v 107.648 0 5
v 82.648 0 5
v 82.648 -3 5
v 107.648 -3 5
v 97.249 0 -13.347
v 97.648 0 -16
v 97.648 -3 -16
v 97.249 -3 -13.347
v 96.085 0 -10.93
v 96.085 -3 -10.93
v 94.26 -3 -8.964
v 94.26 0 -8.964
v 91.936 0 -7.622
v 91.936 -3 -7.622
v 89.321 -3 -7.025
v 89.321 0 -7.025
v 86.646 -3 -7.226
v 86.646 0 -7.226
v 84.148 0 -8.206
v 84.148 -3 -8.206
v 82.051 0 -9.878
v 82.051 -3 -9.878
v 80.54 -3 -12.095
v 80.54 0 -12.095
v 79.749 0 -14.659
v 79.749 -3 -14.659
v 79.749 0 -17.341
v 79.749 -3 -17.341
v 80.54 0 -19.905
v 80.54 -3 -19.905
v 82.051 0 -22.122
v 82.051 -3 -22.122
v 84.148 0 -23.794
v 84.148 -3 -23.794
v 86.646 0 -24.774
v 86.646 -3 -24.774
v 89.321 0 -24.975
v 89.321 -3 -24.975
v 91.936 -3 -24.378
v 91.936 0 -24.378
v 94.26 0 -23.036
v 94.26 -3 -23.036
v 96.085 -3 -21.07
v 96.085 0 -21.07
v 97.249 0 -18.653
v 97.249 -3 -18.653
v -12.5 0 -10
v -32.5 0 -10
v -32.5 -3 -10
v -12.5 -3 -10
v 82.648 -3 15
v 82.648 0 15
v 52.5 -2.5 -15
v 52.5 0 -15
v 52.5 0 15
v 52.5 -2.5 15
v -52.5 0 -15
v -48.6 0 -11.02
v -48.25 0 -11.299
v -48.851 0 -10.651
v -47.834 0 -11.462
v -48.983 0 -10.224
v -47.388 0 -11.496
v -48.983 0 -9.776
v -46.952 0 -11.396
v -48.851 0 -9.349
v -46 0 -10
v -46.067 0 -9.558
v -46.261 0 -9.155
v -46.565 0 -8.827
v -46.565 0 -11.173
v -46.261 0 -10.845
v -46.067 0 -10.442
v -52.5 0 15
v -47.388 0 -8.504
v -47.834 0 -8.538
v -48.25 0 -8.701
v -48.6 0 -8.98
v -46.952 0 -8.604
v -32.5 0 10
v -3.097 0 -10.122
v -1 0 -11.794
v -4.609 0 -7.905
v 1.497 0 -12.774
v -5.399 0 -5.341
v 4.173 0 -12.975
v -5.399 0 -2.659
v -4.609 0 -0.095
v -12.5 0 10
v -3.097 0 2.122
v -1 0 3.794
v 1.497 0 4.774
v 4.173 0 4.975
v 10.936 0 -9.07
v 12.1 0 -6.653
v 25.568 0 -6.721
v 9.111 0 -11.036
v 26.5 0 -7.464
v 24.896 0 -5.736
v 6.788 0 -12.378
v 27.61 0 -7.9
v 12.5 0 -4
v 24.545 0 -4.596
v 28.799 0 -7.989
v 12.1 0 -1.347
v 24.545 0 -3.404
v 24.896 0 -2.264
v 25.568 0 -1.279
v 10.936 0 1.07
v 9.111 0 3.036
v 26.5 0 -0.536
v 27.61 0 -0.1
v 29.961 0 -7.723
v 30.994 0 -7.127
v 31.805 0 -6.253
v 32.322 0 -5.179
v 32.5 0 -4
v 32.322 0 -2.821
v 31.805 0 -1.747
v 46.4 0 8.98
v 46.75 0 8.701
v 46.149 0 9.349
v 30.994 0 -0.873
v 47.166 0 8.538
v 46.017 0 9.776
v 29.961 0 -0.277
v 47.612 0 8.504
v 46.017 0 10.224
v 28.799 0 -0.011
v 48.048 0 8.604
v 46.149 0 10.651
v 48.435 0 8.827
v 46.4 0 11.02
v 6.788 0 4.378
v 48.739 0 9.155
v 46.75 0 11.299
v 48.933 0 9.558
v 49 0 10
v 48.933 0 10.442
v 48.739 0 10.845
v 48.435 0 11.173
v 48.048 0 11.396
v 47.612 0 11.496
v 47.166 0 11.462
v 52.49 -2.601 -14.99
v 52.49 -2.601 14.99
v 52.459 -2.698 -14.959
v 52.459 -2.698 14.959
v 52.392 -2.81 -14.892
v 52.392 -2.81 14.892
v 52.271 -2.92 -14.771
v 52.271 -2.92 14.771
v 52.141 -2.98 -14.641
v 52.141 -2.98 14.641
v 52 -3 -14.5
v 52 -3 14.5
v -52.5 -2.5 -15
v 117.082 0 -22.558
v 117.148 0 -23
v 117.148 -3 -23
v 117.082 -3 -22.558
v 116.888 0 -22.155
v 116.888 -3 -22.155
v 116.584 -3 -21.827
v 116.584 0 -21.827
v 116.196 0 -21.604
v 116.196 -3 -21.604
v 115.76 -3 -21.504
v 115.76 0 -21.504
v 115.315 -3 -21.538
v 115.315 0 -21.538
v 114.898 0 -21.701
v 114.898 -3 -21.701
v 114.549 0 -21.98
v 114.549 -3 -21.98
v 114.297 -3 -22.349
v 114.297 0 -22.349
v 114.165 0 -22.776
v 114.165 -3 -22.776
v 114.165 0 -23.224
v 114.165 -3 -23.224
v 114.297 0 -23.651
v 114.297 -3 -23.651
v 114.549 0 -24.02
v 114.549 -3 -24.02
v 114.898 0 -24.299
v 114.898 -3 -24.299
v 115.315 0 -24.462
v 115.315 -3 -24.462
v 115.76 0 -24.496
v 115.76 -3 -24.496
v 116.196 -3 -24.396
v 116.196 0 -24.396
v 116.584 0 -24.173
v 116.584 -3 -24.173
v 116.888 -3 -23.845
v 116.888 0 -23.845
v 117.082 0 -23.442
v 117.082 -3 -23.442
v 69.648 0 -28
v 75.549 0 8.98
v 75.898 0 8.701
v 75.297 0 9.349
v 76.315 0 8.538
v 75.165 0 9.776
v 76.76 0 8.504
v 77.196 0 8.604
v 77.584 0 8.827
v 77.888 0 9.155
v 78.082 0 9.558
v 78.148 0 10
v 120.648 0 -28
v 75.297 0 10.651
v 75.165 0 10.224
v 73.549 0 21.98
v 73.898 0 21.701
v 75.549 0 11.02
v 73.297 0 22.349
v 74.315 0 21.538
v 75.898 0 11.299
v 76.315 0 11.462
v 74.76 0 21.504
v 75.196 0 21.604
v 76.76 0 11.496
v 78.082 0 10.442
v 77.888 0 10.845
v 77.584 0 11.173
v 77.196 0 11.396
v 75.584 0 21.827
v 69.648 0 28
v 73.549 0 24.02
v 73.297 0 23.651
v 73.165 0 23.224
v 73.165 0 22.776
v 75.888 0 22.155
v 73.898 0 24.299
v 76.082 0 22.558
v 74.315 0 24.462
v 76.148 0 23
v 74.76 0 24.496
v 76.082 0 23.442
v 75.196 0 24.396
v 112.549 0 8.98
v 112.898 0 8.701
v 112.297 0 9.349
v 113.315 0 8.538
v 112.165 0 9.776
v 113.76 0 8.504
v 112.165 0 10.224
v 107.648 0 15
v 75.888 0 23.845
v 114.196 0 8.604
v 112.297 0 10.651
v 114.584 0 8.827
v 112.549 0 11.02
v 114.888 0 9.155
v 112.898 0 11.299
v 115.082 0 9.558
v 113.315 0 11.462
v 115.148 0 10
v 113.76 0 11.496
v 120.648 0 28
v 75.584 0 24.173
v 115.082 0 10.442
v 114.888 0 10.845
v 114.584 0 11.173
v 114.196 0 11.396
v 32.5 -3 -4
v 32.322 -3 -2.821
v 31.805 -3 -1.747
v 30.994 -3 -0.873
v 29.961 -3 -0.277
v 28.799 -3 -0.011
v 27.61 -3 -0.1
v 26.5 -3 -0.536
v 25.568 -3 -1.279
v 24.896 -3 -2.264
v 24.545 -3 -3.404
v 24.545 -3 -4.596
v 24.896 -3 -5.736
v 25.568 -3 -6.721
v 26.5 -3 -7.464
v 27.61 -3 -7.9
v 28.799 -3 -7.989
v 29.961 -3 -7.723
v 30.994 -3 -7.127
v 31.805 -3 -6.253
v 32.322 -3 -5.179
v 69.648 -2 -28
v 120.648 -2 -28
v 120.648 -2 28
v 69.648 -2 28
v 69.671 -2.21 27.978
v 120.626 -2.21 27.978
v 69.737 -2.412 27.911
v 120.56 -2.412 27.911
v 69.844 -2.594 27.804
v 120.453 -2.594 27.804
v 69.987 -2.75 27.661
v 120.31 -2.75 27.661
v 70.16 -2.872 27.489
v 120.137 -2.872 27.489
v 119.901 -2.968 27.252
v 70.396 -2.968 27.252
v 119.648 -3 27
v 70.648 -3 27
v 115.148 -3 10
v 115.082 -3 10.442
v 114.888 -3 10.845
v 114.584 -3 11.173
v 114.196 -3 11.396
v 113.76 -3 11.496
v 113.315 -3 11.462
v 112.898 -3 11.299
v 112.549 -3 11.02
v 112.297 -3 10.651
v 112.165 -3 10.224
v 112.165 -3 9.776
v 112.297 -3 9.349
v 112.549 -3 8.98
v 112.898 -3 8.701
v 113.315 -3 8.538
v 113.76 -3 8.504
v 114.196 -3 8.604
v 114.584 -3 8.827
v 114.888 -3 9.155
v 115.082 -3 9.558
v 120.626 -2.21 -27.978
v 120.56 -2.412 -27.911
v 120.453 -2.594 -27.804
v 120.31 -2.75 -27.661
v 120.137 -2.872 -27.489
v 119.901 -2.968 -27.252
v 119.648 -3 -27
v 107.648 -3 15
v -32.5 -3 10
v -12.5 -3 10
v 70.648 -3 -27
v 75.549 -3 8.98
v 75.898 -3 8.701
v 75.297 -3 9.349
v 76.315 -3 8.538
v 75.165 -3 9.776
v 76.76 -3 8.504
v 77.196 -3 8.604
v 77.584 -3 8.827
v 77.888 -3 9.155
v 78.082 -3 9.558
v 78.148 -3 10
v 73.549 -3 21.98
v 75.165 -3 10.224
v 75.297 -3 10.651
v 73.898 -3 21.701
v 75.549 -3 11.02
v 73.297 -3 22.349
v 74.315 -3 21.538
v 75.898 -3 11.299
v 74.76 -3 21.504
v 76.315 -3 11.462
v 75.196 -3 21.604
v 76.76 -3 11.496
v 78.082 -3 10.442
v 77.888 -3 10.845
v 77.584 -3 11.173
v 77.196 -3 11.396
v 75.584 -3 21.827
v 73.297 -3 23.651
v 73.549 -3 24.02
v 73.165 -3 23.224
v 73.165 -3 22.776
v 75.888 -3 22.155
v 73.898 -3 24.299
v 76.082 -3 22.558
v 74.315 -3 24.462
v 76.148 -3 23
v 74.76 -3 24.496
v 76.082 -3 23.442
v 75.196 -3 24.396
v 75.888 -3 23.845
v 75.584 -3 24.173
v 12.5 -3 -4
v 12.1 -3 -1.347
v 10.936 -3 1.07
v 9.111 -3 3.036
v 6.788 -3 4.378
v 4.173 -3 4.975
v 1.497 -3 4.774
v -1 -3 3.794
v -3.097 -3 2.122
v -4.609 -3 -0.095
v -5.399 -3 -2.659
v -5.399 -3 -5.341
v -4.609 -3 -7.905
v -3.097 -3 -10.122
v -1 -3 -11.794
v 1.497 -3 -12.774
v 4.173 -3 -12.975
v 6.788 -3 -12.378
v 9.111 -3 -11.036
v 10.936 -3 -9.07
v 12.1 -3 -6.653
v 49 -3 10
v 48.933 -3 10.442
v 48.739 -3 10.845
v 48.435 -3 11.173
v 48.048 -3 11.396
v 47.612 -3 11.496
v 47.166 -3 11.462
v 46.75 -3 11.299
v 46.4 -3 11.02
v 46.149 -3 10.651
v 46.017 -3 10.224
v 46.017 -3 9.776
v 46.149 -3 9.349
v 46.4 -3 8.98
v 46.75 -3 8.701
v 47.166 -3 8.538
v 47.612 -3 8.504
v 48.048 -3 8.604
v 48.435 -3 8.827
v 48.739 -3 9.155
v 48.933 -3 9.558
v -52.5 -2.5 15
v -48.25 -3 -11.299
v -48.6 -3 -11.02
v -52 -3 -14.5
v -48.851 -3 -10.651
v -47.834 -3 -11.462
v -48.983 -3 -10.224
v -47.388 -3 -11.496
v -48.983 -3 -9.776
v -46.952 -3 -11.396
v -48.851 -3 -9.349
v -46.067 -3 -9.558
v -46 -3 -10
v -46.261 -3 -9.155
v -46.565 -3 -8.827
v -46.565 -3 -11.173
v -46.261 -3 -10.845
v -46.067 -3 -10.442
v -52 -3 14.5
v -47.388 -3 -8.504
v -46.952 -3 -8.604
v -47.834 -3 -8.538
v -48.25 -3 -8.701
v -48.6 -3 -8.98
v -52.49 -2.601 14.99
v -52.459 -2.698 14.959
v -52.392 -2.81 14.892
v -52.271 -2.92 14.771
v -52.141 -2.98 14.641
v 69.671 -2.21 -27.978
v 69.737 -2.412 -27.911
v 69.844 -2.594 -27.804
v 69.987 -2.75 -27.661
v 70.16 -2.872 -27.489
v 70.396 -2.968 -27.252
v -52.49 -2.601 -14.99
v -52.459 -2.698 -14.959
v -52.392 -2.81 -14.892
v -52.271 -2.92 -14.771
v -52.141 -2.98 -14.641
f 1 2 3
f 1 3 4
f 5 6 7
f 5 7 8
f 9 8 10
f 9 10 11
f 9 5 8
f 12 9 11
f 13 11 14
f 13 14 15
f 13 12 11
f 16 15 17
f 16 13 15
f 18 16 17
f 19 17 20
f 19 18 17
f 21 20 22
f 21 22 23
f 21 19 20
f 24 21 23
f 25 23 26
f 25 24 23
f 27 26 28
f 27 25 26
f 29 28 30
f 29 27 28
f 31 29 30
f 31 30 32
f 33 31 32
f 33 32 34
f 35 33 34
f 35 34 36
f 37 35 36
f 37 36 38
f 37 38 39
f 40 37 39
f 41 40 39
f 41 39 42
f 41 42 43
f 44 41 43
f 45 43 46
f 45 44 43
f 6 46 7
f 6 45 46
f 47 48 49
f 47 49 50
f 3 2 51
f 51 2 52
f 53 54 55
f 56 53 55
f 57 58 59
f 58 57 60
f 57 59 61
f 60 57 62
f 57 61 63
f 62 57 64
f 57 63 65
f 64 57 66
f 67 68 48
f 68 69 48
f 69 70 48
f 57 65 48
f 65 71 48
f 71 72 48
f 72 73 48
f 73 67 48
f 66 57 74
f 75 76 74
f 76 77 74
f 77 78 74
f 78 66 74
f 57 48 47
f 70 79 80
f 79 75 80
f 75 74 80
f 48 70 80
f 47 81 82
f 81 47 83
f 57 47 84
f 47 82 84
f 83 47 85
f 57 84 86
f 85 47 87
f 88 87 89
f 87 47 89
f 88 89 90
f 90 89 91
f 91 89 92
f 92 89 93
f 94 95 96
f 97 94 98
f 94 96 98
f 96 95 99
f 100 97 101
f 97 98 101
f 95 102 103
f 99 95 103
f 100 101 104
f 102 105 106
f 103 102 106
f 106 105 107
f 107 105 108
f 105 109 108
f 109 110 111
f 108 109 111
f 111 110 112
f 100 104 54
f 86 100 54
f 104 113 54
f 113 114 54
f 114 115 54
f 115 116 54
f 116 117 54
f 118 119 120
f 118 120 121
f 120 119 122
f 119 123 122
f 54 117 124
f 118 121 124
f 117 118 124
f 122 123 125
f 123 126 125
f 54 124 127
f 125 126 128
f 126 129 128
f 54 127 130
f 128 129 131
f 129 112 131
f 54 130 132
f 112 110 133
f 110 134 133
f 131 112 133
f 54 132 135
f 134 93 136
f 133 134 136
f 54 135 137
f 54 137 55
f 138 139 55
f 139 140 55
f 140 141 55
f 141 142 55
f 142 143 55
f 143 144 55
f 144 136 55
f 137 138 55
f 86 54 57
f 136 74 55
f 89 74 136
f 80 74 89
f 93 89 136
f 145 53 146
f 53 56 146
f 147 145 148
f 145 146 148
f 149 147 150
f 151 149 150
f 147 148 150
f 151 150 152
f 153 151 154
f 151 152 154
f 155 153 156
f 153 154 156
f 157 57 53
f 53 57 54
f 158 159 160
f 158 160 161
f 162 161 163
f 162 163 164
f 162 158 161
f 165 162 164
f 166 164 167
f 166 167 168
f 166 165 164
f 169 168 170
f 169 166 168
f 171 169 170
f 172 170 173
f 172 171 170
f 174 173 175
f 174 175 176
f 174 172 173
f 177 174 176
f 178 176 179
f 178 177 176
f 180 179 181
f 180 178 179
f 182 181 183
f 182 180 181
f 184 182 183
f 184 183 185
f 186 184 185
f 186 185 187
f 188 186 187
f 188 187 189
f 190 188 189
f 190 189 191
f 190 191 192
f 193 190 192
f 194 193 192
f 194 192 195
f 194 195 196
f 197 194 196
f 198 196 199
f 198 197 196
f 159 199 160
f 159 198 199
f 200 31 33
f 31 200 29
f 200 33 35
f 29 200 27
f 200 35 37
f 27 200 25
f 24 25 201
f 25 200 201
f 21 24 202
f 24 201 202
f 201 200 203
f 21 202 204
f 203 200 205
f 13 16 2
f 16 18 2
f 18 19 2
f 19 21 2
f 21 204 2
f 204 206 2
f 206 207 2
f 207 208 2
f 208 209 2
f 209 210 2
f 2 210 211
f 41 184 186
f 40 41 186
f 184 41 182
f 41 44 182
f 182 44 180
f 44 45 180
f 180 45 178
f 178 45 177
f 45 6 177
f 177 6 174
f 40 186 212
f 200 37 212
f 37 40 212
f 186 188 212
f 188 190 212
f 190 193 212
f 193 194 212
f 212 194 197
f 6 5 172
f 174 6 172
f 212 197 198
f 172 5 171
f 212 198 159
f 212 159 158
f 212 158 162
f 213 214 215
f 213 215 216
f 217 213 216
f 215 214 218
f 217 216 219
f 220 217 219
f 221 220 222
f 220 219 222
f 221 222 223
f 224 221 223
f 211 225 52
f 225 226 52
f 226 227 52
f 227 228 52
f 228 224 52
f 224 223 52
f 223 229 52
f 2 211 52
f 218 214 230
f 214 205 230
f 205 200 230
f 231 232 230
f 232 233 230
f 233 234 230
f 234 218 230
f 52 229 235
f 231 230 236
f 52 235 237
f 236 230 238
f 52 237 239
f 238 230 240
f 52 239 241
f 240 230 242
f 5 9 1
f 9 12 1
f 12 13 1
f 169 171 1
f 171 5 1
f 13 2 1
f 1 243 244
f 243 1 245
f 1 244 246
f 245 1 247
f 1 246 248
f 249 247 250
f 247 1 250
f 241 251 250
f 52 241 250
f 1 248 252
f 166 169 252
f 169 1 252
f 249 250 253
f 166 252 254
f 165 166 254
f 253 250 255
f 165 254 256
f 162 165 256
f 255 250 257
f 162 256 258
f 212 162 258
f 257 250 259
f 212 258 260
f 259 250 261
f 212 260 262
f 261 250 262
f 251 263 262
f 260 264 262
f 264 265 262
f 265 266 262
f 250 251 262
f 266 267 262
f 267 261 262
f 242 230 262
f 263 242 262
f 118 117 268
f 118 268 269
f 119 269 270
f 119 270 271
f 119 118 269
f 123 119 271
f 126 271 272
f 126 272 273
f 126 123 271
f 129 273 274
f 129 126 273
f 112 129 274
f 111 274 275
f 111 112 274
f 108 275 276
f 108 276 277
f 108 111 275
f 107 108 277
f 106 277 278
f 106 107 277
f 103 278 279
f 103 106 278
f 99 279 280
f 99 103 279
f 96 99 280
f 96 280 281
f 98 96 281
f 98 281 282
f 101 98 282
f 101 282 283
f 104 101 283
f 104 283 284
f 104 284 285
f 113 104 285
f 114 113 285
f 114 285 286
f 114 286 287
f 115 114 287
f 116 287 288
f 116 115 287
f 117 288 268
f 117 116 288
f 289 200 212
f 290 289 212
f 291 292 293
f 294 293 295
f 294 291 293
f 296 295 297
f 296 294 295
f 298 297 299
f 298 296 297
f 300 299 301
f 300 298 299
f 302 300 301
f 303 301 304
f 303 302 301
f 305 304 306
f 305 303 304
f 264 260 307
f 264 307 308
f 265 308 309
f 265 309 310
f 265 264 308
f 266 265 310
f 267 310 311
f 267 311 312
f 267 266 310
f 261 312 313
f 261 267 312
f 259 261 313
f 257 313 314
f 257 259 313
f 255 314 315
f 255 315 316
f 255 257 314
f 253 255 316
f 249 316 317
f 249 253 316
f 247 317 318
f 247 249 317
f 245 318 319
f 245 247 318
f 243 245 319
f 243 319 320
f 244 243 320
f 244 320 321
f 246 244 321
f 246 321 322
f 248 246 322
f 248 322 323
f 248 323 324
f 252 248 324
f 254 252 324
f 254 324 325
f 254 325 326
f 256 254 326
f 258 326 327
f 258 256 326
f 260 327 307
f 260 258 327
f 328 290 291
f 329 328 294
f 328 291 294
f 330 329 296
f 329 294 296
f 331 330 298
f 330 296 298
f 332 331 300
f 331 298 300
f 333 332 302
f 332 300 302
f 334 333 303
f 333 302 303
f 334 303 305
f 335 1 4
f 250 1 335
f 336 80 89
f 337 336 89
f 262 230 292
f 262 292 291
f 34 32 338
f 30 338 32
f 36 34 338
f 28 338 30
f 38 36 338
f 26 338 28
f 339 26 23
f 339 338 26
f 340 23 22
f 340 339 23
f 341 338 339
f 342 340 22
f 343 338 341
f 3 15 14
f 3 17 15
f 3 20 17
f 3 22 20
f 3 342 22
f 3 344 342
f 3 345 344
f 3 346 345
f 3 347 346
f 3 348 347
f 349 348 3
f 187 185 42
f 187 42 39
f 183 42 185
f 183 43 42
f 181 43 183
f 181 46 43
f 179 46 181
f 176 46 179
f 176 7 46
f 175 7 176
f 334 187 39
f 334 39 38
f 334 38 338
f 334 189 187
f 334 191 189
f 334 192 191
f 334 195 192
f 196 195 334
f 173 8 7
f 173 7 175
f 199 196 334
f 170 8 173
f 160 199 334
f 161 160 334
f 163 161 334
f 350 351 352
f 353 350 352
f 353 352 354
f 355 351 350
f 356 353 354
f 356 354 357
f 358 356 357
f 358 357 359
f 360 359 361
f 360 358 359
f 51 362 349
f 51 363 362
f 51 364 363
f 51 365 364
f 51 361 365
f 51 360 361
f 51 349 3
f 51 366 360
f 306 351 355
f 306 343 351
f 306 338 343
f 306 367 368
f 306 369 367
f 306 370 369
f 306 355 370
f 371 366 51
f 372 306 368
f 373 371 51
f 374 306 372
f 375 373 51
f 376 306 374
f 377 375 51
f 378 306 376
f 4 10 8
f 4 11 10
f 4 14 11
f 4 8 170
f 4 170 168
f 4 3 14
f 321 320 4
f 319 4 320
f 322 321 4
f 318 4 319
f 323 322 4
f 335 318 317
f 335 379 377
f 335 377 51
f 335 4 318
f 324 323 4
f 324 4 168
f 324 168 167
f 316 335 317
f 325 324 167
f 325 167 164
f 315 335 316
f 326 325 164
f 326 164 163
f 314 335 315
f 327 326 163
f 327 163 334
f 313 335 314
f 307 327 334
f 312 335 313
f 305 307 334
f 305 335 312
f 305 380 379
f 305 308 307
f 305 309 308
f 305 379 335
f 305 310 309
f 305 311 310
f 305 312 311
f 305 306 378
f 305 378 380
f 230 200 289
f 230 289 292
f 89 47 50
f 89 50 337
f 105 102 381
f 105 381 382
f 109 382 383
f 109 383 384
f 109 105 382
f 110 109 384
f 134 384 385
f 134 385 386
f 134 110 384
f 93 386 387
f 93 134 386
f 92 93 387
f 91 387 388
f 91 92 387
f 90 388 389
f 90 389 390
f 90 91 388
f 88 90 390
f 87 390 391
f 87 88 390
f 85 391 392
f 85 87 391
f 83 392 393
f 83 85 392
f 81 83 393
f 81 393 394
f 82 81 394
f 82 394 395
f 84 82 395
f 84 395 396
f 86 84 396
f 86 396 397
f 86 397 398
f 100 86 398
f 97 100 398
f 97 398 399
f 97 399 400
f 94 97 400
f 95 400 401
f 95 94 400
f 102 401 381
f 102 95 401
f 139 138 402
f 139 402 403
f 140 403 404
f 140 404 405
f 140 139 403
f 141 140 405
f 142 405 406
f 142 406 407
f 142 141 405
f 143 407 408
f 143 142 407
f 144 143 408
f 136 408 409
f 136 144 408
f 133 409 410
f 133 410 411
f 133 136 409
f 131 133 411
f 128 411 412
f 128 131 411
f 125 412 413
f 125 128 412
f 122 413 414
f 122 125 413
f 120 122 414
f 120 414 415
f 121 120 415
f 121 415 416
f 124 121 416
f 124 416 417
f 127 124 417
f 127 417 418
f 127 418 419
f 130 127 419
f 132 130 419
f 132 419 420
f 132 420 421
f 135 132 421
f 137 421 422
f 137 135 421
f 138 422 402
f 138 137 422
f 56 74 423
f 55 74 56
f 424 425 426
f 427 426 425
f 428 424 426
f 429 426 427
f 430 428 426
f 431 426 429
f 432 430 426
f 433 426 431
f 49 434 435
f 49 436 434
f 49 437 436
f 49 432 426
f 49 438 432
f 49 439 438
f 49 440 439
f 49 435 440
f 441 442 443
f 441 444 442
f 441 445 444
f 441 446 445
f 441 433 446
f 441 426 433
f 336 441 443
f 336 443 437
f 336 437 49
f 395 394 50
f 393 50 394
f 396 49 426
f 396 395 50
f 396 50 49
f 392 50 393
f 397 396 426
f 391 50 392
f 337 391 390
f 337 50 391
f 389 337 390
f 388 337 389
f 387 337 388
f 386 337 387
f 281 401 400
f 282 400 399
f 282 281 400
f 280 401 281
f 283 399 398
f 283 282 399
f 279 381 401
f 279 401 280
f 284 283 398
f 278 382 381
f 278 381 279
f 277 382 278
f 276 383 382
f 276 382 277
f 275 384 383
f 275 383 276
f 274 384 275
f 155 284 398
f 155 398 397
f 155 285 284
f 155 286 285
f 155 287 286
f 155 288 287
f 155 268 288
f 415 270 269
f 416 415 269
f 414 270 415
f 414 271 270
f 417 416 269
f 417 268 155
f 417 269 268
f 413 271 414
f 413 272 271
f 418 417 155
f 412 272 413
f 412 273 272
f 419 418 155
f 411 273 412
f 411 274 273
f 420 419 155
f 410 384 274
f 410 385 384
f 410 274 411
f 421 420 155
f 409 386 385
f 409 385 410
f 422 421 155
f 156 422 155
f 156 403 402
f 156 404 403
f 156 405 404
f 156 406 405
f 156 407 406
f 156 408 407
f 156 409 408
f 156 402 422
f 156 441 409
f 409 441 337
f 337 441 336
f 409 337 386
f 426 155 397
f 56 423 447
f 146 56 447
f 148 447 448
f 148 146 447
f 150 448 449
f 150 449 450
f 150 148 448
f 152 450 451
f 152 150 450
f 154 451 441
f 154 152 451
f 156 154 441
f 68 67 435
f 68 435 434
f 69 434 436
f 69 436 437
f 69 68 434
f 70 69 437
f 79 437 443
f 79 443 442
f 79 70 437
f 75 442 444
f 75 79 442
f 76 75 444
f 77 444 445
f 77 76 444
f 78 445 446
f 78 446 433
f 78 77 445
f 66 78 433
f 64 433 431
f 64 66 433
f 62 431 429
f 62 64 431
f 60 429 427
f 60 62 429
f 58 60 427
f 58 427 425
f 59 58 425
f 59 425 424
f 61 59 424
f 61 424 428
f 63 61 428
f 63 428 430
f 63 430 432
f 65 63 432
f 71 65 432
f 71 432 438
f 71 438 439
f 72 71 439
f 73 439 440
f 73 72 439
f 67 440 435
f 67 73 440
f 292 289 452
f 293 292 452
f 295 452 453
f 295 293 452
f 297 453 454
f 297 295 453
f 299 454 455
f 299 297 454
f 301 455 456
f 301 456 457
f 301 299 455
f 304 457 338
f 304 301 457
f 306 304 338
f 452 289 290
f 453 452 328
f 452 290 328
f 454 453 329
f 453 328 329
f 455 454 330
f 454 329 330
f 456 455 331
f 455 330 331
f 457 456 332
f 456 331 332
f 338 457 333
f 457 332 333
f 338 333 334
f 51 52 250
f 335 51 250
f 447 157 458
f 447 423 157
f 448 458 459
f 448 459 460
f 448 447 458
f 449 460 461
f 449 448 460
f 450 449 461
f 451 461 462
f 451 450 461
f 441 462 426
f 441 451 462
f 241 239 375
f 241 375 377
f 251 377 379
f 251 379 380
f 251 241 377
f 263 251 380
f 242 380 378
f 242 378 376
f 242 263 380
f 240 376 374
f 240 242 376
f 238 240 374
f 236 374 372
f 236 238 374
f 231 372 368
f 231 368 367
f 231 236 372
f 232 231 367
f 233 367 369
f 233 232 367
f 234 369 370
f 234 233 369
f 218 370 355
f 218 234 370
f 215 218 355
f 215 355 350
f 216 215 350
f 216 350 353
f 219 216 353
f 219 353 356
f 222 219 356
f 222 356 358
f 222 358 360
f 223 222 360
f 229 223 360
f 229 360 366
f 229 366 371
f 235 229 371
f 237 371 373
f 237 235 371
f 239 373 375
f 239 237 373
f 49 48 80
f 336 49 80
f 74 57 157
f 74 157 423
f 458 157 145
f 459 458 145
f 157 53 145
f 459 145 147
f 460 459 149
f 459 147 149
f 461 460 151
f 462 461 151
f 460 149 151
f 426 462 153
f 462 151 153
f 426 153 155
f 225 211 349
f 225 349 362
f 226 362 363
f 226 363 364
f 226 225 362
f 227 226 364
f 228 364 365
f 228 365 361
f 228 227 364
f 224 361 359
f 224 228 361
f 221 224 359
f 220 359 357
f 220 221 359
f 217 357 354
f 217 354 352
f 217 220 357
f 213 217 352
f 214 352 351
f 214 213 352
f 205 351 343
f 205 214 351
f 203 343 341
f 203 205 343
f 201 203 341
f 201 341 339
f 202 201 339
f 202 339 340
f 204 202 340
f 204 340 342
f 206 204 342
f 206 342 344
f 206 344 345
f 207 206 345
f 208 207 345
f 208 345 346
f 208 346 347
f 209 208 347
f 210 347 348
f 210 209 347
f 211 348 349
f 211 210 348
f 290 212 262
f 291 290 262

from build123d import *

# Parameters (mm, degrees)
F0_W     = 105
F0_H     = 30
F0_R     = 1.5
F0_R_2   = 9
F0_R_3   = 4
F0_W_2   = 20
F0_H_2   = 20
F1_DEPTH = 3
F2_R     = 0.5
F3_W     = 51
F3_H     = 56
F3_R     = 9
F3_R_2   = 1.5
F3_W_2   = 25
F3_H_2   = 10
F4_DEPTH = 3
F5_R     = 1


with BuildPart() as f1:
    # F0 (on Front) → F1 (new body)
    with BuildSketch(Plane.XZ):
        Rectangle(F0_W, F0_H)
        with Locations((-47.5, -10)):
            Circle(F0_R, mode=Mode.SUBTRACT)
        with Locations((3.5, -4)):
            Circle(F0_R_2, mode=Mode.SUBTRACT)
        with Locations((28.5, -4)):
            Circle(F0_R_3, mode=Mode.SUBTRACT)
        with Locations((-22.5, 0)):
            Rectangle(F0_W_2, F0_H_2, mode=Mode.SUBTRACT)
        with Locations((47.5, 10)):
            Circle(F0_R, mode=Mode.SUBTRACT)
    extrude(amount=F1_DEPTH)

    # F2
    f2_edges = [f1.edges().sort_by_distance(p)[0] for p in [
        (0, -3, 15),
        (-52.5, -3, 0),
        (0, -3, -15),
        (52.5, -3, 0),
    ]]
    fillet(f2_edges, radius=F2_R)


with BuildPart() as f4:
    # F3 (on Front) → F4 (new body)
    with BuildSketch(Plane.XZ):
        with Locations((95.148362, 0)):
            Rectangle(F3_W, F3_H)
        with Locations((88.648362, -16)):
            Circle(F3_R, mode=Mode.SUBTRACT)
        with Locations((115.648362, -23)):
            Circle(F3_R_2, mode=Mode.SUBTRACT)
        with Locations((76.648362, 10)):
            Circle(F3_R_2, mode=Mode.SUBTRACT)
        with Locations((74.648362, 23)):
            Circle(F3_R_2, mode=Mode.SUBTRACT)
        with Locations((95.148362, 10)):
            Rectangle(F3_W_2, F3_H_2, mode=Mode.SUBTRACT)
        with Locations((113.648362, 10)):
            Circle(F3_R_2, mode=Mode.SUBTRACT)
    extrude(amount=F4_DEPTH)

    # F5
    f5_edges = [f4.edges().sort_by_distance(p)[0] for p in [
        (95.148362, -3, 28),
        (69.648362, -3, 0),
        (120.648362, -3, 0),
        (95.148362, -3, -28),
    ]]
    fillet(f5_edges, radius=F5_R)


solid = Compound([f1.part, f4.part])
